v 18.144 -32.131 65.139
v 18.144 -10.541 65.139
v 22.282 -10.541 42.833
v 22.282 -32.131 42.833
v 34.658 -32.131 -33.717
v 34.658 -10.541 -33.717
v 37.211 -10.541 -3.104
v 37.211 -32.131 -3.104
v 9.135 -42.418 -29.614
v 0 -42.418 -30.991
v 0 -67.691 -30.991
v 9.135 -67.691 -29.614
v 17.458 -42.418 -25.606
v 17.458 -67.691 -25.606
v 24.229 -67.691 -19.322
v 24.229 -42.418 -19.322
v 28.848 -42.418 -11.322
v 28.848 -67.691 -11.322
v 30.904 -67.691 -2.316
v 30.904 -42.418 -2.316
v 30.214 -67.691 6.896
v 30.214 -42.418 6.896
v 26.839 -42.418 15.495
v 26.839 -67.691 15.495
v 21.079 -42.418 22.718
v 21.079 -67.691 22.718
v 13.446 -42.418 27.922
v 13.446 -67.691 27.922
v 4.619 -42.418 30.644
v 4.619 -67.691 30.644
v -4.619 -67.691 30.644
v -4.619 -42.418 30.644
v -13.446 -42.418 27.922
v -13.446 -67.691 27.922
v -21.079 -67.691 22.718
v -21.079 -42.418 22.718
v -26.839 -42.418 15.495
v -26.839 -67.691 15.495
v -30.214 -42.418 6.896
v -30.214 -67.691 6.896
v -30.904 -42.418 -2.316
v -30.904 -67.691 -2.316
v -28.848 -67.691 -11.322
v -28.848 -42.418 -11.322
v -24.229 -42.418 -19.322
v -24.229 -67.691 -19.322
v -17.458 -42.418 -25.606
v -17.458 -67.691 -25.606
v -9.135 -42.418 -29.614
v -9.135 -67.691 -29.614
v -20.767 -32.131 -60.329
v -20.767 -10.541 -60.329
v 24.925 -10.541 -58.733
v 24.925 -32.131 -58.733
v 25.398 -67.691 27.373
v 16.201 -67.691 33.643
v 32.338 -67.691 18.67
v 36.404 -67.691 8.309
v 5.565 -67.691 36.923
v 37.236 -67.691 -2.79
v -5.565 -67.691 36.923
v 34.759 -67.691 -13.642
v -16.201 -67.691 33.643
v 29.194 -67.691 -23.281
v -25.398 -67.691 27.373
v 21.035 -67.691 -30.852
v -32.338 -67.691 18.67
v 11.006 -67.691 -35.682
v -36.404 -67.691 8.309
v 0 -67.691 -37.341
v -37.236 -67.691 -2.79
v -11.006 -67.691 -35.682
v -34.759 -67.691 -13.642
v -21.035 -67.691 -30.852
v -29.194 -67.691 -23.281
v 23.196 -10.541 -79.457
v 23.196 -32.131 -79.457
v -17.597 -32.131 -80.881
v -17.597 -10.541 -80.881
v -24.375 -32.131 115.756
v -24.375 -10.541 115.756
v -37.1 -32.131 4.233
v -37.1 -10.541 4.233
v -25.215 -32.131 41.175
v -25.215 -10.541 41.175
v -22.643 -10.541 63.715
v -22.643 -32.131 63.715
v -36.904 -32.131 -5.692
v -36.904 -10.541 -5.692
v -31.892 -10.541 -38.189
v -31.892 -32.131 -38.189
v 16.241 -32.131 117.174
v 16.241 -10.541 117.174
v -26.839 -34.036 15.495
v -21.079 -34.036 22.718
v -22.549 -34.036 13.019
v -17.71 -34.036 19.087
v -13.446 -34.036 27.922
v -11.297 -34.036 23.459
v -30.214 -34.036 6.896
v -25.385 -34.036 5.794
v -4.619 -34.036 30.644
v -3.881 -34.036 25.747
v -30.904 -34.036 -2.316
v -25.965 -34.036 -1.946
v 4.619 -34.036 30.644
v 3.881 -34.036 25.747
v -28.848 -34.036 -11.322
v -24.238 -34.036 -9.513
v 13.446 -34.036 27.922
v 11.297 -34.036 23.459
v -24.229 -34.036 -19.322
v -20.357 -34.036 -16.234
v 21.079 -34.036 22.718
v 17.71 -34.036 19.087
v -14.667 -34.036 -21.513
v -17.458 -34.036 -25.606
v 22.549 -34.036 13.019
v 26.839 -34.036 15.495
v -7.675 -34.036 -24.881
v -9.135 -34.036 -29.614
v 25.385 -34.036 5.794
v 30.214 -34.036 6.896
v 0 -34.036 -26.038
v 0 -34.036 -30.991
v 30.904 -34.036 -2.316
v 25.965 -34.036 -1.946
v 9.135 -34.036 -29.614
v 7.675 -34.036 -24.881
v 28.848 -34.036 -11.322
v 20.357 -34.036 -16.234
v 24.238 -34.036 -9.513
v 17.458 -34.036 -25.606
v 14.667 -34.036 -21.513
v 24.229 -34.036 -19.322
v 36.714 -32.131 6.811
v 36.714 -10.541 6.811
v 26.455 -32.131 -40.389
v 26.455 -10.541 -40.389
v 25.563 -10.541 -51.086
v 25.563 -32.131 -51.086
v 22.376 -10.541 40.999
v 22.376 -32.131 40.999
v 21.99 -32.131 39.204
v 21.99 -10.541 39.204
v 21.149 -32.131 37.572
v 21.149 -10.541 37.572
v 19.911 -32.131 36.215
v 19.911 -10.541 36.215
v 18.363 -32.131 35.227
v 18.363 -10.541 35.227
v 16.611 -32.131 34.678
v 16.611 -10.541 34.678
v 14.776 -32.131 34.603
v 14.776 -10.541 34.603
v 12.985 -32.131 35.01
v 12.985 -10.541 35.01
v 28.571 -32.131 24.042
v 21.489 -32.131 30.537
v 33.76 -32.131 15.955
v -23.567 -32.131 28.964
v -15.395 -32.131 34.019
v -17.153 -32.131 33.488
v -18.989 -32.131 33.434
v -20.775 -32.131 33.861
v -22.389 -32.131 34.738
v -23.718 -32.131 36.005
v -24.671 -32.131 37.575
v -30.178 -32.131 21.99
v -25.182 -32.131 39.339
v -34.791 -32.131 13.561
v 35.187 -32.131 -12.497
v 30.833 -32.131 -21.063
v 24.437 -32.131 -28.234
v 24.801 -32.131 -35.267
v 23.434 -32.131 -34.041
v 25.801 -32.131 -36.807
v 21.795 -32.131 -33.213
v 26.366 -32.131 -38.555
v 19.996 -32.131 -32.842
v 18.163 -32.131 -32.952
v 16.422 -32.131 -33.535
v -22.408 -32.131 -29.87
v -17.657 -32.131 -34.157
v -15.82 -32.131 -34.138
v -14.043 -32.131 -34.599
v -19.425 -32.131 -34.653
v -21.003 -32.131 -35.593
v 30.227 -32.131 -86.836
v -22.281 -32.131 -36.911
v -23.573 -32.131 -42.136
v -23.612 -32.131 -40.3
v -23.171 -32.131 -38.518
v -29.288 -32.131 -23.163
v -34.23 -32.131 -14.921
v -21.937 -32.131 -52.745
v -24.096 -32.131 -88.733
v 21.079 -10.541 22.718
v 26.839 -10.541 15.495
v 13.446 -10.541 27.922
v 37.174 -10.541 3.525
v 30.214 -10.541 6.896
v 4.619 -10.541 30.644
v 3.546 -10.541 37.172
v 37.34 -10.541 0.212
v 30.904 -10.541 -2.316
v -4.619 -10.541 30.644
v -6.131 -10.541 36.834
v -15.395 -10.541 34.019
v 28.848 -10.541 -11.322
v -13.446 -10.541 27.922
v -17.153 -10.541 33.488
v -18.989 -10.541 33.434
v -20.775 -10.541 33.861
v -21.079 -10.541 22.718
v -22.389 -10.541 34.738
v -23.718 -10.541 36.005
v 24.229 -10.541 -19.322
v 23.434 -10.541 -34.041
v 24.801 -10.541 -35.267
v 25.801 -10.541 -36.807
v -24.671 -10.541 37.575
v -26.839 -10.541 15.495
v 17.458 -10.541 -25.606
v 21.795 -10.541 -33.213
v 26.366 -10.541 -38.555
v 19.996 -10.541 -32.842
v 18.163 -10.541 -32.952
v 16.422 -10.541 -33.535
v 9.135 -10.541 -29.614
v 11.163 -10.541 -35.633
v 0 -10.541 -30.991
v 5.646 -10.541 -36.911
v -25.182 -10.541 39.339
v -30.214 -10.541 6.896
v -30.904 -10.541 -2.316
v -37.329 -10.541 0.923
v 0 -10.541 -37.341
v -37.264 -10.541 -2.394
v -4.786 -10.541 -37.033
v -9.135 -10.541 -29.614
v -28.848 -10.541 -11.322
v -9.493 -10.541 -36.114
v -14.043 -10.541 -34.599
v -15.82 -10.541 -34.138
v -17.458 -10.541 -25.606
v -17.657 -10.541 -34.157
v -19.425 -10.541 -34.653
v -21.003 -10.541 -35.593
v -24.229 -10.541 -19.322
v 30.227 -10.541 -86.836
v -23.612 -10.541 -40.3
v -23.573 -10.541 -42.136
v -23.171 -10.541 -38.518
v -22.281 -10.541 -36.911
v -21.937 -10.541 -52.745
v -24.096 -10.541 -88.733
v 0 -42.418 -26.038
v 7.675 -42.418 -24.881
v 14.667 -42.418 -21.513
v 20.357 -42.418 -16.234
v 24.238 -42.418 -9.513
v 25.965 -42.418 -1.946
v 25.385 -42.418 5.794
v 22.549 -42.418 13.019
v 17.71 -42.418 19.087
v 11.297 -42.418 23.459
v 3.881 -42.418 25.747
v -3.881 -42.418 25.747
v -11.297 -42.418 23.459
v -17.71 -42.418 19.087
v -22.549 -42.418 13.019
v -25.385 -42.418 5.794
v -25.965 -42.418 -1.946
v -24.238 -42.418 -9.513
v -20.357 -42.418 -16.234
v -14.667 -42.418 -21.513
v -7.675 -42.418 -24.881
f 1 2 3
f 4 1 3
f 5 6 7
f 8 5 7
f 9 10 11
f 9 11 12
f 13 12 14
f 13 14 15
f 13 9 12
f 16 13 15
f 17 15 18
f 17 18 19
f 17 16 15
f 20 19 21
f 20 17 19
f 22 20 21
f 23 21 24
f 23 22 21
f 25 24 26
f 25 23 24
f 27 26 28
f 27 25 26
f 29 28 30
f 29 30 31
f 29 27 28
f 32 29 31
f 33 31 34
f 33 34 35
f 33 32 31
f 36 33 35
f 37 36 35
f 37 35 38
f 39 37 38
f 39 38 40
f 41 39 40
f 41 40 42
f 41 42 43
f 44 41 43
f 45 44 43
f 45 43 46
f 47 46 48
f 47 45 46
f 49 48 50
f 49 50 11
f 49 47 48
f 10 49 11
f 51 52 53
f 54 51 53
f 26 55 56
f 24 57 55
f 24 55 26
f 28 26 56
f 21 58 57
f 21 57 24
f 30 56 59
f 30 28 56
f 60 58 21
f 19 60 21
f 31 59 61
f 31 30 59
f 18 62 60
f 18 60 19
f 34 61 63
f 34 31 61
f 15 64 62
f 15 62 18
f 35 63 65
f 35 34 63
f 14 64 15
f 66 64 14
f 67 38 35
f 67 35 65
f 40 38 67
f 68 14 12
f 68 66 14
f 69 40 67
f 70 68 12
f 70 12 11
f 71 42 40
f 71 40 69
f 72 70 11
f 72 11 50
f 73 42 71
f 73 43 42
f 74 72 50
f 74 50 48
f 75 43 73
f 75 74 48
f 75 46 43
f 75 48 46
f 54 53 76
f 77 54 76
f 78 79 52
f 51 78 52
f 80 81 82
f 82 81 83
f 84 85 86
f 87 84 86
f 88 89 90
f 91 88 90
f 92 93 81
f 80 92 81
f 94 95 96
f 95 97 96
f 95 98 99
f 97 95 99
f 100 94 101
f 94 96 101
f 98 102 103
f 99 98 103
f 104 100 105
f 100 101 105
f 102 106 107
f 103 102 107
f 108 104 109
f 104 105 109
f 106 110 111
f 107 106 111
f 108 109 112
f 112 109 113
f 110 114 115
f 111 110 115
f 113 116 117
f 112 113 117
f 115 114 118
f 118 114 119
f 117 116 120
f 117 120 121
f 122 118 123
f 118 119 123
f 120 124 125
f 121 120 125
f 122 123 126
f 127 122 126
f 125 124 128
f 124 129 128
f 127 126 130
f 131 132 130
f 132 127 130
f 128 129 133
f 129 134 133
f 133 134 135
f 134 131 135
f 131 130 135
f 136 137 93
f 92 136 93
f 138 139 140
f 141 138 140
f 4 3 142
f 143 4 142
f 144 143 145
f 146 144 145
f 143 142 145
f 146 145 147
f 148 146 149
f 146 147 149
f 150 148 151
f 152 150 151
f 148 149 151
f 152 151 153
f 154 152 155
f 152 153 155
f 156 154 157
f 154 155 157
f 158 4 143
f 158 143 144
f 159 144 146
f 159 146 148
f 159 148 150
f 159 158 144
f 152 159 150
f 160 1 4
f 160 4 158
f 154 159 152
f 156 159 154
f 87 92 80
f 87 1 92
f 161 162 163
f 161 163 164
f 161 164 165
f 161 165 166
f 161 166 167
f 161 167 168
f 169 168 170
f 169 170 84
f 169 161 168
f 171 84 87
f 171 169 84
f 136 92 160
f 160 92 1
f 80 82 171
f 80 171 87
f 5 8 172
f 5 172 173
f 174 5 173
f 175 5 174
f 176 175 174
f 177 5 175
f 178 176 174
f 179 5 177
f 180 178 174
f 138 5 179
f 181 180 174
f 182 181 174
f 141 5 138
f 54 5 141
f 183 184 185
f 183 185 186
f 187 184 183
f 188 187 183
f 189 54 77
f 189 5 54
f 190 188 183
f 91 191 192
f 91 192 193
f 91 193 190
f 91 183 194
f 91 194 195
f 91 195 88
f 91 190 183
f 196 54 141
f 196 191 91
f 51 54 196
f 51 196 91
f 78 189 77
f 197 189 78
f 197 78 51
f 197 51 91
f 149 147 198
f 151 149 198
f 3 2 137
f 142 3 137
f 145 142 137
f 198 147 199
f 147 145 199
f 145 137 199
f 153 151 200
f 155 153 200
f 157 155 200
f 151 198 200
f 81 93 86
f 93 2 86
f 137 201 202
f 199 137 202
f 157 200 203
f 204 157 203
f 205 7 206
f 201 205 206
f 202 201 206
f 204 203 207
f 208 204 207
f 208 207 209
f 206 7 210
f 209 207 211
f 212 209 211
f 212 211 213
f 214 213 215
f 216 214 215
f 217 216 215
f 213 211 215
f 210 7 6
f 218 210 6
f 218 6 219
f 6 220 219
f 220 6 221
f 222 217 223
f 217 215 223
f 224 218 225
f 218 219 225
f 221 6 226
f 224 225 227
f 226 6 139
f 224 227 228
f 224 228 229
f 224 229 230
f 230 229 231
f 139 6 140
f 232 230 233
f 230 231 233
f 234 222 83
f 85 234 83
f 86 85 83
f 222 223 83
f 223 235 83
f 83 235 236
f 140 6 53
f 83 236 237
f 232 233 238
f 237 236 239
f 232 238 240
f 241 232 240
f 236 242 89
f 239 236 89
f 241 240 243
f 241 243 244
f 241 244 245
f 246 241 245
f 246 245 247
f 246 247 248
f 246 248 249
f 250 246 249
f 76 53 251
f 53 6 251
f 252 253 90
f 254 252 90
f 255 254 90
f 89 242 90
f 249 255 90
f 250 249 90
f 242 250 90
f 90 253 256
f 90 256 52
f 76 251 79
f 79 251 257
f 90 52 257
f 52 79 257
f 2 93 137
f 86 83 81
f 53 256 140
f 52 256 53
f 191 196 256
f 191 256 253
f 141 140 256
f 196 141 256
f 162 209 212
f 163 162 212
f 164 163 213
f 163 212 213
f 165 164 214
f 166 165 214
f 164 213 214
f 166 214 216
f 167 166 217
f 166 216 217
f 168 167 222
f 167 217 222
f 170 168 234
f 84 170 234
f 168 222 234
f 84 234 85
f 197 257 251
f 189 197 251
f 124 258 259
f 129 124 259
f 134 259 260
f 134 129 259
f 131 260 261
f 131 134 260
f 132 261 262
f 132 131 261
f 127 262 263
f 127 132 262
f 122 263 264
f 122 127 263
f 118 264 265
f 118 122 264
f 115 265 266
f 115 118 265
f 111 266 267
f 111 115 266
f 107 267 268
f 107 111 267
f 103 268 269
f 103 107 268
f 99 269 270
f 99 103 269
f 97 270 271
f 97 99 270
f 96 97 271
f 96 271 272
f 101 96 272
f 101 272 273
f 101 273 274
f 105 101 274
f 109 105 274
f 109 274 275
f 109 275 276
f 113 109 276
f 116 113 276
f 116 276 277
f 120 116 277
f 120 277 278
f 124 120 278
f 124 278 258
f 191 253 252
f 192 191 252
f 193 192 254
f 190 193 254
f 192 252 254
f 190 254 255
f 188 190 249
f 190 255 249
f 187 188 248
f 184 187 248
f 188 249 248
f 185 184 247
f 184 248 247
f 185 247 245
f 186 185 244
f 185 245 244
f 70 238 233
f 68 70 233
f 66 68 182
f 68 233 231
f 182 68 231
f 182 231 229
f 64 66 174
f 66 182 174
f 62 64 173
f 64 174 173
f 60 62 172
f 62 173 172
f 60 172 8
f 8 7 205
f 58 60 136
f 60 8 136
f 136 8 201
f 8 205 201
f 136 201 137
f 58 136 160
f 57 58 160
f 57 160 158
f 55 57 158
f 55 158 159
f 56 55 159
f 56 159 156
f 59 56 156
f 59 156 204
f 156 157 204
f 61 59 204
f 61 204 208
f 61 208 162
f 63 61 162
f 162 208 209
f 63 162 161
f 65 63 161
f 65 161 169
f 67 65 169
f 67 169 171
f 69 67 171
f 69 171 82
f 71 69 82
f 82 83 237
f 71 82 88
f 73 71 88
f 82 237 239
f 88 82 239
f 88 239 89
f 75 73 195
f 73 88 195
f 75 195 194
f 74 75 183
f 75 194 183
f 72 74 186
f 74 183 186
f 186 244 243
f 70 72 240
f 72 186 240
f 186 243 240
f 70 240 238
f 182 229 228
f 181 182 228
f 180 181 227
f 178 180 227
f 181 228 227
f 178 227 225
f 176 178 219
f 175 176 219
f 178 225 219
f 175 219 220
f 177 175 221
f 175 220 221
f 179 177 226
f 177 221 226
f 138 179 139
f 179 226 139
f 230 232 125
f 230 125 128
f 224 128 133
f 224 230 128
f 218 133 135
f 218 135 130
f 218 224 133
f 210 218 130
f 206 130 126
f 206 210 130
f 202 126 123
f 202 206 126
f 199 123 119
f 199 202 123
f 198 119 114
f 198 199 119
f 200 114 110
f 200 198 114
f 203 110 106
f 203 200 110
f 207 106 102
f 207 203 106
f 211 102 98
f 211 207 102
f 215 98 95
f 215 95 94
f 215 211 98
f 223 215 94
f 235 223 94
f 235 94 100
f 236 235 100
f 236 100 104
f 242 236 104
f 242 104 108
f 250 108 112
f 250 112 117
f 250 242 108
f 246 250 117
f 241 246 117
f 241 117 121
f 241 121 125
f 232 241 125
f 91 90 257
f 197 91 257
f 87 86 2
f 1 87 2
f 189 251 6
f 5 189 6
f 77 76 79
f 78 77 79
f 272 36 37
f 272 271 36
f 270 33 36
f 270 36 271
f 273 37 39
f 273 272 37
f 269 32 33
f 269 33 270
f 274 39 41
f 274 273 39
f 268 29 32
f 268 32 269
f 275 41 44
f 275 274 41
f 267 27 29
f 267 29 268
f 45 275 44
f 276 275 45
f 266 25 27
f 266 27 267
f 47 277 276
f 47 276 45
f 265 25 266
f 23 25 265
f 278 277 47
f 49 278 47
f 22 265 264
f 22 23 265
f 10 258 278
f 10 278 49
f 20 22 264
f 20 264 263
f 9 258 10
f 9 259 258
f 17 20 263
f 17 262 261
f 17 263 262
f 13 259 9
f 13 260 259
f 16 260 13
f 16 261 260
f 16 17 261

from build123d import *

# Parameters (mm, degrees)
MAIN_BODY_R         = 37.34054
MAIN_BODY_R_2       = 30.99054
MAIN_BODY_R_3       = 26.03754
BOSS_EXTRUDE1_DEPTH = 57.15
MAIN_BODY_5_R       = 30.99054
MAIN_BODY_5_R_2     = 26.03754
CUT_EXTRUDE2_DEPTH  = 23.495
CUT_EXTRUDE3_START  = 31.877
MAIN_BODY_6_R       = 30.99054
MAIN_BODY_6_R_2     = 26.03754
CUT_EXTRUDE3_DEPTH  = 25.273
BOSS_EXTRUDE2_DEPTH = 21.59
BOSS_EXTRUDE3_DEPTH = 21.59


with BuildPart() as part:
    # Main Body → Boss-Extrude1 (new body)
    # profile 1 of 2: a face of its own
    with BuildSketch(Plane(origin=(0, -10.541, 0), x_dir=(-1, 0, 0), z_dir=(0, -1, 0))):
        with Locations(Location((0, 0, 0), (0, 0, 90))):
            Circle(MAIN_BODY_R)
        Circle(MAIN_BODY_R_2, mode=Mode.SUBTRACT)
    # profile 2 of 2: a face of its own
    with BuildSketch(Plane(origin=(0, -10.541, 0), x_dir=(-1, 0, 0), z_dir=(0, -1, 0))):
        Circle(MAIN_BODY_R_2)
        with Locations(Location((0, 0, 0), (0, 0, 90))):
            Circle(MAIN_BODY_R_3, mode=Mode.SUBTRACT)
    extrude(amount=BOSS_EXTRUDE1_DEPTH)

    # Main Body<5> → Cut-Extrude2 (cut)
    with BuildSketch(Plane(origin=(0, -10.541, 0), x_dir=(-1, 0, 0), z_dir=(0, -1, 0))):
        with Locations(Location((0, 0, 0), (0, 0, 90))):
            Circle(MAIN_BODY_5_R)
        with Locations(Location((0, 0, 0), (0, 0, 90))):
            Circle(MAIN_BODY_5_R_2, mode=Mode.SUBTRACT)
    extrude(amount=CUT_EXTRUDE2_DEPTH, mode=Mode.SUBTRACT)

    # Main Body<6> → Cut-Extrude3 (cut)
    with BuildSketch(Plane(origin=(0, -10.541, 0), x_dir=(-1, 0, 0), z_dir=(0, -1, 0)).offset(CUT_EXTRUDE3_START)):
        with Locations(Location((0, 0, 0), (0, 0, 90))):
            Circle(MAIN_BODY_6_R)
        with Locations(Location((0, 0, 0), (0, 0, 90))):
            Circle(MAIN_BODY_6_R_2, mode=Mode.SUBTRACT)
    extrude(amount=CUT_EXTRUDE3_DEPTH, mode=Mode.SUBTRACT)

    # Main Body<7> → Boss-Extrude2 (add)
    # profile 1 of 3: a face of its own
    with BuildSketch(Plane(origin=(0, -10.541, 0), x_dir=(-1, 0, 0), z_dir=(0, -1, 0))):
        with BuildLine():
            ThreePointArc((14.04286423, 34.599333689), (23.506970789, 33.71138504), (31.892042271, 38.188922533))
            Line((31.892042271, 38.188922533), (24.09649432, 88.732685748))
            Line((24.09649432, 88.732685748), (-30.227475734, 86.835650912))
            Line((-30.227475734, 86.835650912), (-34.657917418, 33.717474684))
            ThreePointArc((-34.657917418, 33.717474684), (-25.561615202, 31.465837631), (-16.422184031, 33.535470761))
            ThreePointArc((-16.422184031, 33.535470761), (-23.434260482, 34.041037689), (-26.454981852, 40.389270237))
            Line((-26.454981852, 40.389270237), (-25.562757718, 51.086469788))
            Line((-25.562757718, 51.086469788), (21.936876136, 52.745193552))
            Line((21.936876136, 52.745193552), (23.573125777, 42.136290252))
            ThreePointArc((23.573125777, 42.136290252), (21.002593049, 35.592806809), (14.04286423, 34.599333689))
        make_face()
        Polygon((17.597375259, 80.881086782), (20.76719935, 60.328992267), (-24.924949261, 58.733387277), (-23.196488344, 79.456533674), align=None, mode=Mode.SUBTRACT)
    # profile 2 of 3: a face of its own
    with BuildSketch(Plane(origin=(0, -10.541, 0), x_dir=(-1, 0, 0), z_dir=(0, -1, 0))):
        with BuildLine():
            ThreePointArc((14.04286423, 34.599333689), (29.288407022, 23.162580633), (36.904181225, 5.691865742))
            Line((36.904181225, 5.691865742), (31.892042271, 38.188922533))
            ThreePointArc((31.892042271, 38.188922533), (23.506970789, 33.71138504), (14.04286423, 34.599333689))
        make_face()
    # profile 3 of 3: a face of its own
    with BuildSketch(Plane(origin=(0, -10.541, 0), x_dir=(-1, 0, 0), z_dir=(0, -1, 0))):
        with BuildLine():
            ThreePointArc((-37.211328977, 3.103695095), (-30.832801883, 21.063101755), (-16.422184031, 33.535470761))
            ThreePointArc((-16.422184031, 33.535470761), (-25.561615202, 31.465837631), (-34.657917418, 33.717474684))
            Line((-34.657917418, 33.717474684), (-37.211328977, 3.103695095))
        make_face()
    extrude(amount=BOSS_EXTRUDE2_DEPTH)

    # Main Body<8> → Boss-Extrude3 (add)
    with BuildSketch(Plane(origin=(0, -10.541, 0), x_dir=(-1, 0, 0), z_dir=(0, -1, 0))):
        with BuildLine():
            ThreePointArc((37.099808191, -4.233220956), (30.17838959, -21.990469055), (15.395357729, -34.01909593))
            ThreePointArc((15.395357729, -34.01909593), (22.38882917, -34.737546541), (25.215213948, -41.174654833))
            Line((25.215213948, -41.174654833), (22.643322984, -63.714622021))
            Line((22.643322984, -63.714622021), (-18.14365763, -65.138934769))
            Line((-18.14365763, -65.138934769), (-22.281592226, -42.833279853))
            ThreePointArc((-22.281592226, -42.833279853), (-19.911122354, -36.214693398), (-12.984803239, -35.010152989))
            ThreePointArc((-12.984803239, -35.010152989), (-28.570898972, -24.042039419), (-36.714140357, -6.810860839))
            Line((-36.714140357, -6.810860839), (-16.240572134, -117.174216531))
            Line((-16.240572134, -117.174216531), (24.374671076, -115.755900985))
            Line((24.374671076, -115.755900985), (37.099808191, -4.233220956))
        make_face()
    extrude(amount=BOSS_EXTRUDE3_DEPTH)


solid = part.part
